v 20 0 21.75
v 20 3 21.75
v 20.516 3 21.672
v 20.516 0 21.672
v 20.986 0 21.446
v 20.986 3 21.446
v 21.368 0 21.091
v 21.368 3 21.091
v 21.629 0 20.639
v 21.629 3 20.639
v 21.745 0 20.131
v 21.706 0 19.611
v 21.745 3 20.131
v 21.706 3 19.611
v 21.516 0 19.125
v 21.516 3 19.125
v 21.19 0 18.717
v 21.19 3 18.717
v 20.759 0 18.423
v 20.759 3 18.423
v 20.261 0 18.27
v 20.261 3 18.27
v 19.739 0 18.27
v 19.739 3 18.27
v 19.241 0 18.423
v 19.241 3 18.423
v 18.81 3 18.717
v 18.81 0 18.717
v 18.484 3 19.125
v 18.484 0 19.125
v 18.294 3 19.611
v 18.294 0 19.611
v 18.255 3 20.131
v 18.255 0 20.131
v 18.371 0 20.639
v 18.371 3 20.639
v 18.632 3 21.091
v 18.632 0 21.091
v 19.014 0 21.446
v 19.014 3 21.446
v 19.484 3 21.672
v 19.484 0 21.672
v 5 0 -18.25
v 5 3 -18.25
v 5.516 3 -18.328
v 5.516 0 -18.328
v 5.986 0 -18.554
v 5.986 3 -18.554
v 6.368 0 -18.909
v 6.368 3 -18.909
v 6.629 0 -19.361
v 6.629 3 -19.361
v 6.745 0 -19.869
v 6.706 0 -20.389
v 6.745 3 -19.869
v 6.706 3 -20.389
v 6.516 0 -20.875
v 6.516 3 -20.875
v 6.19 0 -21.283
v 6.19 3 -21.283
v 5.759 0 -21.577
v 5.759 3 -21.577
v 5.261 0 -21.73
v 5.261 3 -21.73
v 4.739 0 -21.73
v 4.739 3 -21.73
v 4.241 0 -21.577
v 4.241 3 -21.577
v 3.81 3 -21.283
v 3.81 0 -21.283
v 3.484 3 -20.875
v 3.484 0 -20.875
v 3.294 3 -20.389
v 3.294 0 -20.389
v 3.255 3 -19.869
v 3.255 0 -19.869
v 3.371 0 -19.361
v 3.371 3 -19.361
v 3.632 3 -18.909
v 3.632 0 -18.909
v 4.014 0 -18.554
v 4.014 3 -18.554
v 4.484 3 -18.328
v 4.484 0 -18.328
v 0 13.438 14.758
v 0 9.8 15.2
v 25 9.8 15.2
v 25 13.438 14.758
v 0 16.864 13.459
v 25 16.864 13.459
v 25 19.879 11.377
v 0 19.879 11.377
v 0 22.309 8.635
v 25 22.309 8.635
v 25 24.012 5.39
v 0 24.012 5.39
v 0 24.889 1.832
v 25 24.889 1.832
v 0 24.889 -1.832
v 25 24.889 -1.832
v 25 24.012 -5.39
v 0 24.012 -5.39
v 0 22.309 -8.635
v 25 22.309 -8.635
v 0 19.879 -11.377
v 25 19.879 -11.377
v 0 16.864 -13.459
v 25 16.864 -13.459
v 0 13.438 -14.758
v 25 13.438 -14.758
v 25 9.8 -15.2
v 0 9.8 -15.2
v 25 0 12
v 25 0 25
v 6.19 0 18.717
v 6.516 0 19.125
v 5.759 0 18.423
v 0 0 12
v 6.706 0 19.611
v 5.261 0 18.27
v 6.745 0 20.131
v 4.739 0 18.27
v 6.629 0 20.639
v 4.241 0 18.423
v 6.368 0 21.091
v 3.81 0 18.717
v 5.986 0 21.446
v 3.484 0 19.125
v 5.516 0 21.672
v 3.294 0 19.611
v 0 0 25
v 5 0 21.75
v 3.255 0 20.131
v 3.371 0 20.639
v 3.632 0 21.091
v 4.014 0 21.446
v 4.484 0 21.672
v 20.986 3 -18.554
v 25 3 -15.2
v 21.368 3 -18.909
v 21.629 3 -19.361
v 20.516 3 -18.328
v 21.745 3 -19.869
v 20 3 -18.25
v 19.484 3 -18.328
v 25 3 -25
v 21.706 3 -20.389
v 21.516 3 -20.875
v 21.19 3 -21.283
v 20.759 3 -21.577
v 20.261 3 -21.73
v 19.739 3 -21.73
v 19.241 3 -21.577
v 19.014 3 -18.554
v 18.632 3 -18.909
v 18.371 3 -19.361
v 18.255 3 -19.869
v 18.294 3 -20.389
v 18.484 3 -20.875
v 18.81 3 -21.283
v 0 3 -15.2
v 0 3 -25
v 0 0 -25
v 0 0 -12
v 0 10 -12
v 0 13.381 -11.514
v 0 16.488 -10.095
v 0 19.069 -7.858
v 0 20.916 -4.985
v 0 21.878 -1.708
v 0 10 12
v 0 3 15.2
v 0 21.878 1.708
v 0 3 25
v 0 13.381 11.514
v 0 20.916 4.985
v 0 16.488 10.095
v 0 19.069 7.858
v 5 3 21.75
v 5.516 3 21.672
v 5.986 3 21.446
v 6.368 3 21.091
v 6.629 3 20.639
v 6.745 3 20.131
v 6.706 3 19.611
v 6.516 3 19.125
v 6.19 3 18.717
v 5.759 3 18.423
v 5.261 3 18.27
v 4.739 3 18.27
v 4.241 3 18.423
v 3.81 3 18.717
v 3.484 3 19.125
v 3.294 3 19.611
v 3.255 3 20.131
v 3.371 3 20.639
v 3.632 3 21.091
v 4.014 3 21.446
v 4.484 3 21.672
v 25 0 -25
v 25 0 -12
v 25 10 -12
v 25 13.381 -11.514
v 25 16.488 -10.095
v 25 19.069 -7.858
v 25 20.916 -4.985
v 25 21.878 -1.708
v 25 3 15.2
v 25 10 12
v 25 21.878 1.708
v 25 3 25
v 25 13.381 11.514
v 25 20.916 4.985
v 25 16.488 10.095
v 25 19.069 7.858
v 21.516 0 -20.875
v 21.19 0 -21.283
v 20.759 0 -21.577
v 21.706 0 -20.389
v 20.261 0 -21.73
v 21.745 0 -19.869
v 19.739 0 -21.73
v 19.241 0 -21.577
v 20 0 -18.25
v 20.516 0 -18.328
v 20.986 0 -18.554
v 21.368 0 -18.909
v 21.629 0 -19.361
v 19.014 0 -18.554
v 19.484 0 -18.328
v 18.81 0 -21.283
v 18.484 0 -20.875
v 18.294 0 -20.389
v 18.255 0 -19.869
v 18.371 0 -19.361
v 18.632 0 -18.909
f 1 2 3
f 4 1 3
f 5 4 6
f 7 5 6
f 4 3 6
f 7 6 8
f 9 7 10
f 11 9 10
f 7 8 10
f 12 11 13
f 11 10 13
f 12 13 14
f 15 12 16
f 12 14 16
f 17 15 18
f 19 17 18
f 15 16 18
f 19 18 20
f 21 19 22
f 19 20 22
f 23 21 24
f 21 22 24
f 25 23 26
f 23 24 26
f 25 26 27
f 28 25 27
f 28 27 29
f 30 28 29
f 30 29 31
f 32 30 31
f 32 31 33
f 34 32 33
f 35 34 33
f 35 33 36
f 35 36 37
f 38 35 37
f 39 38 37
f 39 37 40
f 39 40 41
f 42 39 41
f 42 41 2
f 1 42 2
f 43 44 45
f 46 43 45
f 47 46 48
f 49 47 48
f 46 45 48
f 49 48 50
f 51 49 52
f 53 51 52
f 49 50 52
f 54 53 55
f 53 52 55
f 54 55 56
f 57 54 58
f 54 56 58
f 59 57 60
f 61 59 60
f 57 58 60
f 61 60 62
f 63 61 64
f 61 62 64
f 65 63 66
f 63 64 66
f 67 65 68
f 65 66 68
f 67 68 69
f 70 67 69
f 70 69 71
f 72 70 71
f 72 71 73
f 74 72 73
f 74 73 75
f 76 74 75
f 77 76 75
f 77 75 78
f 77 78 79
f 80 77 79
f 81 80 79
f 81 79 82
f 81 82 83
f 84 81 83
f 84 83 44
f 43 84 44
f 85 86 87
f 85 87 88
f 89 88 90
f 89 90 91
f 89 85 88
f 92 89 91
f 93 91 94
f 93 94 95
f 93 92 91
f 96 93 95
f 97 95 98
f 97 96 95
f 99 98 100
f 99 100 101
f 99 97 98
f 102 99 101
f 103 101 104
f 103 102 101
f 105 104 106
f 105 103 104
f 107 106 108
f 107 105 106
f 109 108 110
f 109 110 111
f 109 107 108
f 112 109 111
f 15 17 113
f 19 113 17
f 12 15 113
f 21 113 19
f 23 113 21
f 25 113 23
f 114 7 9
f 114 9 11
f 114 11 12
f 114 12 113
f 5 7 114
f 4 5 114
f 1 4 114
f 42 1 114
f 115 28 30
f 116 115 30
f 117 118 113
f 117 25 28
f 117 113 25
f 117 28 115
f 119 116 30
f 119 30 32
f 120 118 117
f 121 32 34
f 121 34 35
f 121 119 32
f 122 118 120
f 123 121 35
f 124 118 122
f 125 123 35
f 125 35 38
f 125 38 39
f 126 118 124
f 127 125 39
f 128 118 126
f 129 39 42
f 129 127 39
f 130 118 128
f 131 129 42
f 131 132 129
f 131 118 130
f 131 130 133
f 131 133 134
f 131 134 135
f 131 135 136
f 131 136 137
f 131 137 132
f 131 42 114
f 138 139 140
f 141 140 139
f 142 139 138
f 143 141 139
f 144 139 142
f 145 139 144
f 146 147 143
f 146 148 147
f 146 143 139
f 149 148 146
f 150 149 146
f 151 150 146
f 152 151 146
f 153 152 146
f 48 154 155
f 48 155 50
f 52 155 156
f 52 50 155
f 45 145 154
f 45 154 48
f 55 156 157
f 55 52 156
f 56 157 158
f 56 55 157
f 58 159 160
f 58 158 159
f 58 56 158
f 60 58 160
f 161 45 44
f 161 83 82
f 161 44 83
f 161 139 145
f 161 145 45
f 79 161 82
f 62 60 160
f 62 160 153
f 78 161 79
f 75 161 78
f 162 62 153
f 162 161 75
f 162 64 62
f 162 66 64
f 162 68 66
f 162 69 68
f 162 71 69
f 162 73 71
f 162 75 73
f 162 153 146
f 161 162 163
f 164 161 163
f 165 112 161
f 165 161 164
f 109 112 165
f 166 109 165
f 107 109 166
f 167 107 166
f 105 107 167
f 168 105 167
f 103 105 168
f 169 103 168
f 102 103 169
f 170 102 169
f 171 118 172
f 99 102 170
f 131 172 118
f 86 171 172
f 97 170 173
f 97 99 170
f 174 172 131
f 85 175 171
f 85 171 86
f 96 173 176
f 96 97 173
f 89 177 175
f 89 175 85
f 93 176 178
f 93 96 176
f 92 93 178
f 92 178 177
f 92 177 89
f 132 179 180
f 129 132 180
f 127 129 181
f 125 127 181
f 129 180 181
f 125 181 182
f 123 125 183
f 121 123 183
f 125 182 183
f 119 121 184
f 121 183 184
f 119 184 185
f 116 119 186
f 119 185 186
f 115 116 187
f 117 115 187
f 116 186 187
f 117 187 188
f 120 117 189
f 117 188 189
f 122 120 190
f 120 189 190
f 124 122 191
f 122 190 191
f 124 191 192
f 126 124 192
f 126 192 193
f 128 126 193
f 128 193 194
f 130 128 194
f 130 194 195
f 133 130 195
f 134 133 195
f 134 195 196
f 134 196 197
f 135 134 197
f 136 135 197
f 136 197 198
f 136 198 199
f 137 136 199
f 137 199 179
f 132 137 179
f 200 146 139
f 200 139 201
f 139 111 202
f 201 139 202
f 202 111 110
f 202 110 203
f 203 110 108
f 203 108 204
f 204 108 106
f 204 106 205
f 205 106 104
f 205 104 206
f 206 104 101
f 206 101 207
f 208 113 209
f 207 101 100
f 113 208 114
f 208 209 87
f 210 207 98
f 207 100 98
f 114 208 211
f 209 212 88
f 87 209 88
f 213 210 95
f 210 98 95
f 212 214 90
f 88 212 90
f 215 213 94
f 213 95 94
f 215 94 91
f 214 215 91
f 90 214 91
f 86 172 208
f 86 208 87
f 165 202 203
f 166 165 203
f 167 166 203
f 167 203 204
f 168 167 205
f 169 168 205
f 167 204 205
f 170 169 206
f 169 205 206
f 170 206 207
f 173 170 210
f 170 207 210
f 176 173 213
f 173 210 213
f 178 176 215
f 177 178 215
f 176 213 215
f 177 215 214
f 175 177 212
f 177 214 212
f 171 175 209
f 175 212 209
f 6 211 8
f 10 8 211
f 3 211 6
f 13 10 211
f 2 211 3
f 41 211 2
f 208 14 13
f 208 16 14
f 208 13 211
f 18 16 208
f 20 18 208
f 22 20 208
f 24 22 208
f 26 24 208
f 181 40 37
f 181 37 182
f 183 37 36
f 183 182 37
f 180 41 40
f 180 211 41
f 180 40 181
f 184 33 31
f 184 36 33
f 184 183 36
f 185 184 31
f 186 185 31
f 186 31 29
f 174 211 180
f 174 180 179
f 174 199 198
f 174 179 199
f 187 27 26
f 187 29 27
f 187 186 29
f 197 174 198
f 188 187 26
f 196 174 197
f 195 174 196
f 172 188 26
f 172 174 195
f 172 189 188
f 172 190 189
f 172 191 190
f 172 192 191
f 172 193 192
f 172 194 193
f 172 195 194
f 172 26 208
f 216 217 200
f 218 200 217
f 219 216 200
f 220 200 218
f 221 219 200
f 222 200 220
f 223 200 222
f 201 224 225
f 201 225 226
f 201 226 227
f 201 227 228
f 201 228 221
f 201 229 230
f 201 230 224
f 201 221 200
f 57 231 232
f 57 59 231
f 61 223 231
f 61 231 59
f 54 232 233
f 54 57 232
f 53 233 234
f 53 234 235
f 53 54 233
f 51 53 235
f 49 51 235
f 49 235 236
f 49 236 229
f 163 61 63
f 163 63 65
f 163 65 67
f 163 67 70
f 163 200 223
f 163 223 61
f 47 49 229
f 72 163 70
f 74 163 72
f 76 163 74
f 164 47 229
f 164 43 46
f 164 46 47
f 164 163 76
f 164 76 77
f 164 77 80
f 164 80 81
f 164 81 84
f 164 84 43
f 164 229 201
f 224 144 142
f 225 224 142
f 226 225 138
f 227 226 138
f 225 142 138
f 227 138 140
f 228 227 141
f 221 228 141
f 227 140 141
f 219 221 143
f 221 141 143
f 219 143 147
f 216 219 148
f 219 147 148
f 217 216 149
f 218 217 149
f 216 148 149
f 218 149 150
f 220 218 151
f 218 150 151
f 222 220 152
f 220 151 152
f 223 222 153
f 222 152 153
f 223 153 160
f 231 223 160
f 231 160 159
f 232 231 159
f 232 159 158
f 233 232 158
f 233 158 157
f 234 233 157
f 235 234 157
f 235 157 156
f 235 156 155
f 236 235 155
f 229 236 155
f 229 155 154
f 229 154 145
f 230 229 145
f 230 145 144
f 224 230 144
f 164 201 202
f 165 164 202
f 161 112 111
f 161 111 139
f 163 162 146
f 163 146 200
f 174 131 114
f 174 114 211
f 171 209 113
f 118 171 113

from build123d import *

# Parameters (mm, degrees)
BOSS_EXTRUDE1_DEPTH = 25
CUT_EXTRUDE1_DEPTH  = 44.301270189
SKETCH3_R           = 1.75
CUT_EXTRUDE2_DEPTH  = 42.641325627


with BuildPart() as part:
    # Sketch1 → Boss-Extrude1 (new body)
    with BuildSketch(Plane(origin=(0, 0, 0), x_dir=(0, 0, -1), z_dir=(1, 0, 0))):
        with BuildLine():
            Line((-25, 0), (-25, 3))
            Line((-25, 3), (-15.2, 3))
            Line((-15.2, 3), (-15.2, 9.8))
            ThreePointArc((-15.2, 9.8), (0, 25), (15.2, 9.8))
            Line((15.2, 9.8), (15.2, 3))
            Line((15.2, 3), (25, 3))
            Line((25, 3), (25, 0))
            Line((25, 0), (-25, 0))
        make_face()
    extrude(amount=BOSS_EXTRUDE1_DEPTH)

    # Sketch2 → Cut-Extrude1 (cut, through all)
    with BuildSketch(Plane(origin=(25, 0, 0), x_dir=(0, 0, -1), z_dir=(1, 0, 0))):
        with BuildLine():
            Line((-12, 10), (-12, 0))
            Line((-12, 0), (12, 0))
            Line((12, 0), (12, 10))
            ThreePointArc((12, 10), (0, 22), (-12, 10))
        make_face()
    extrude(amount=-CUT_EXTRUDE1_DEPTH, mode=Mode.SUBTRACT)

    # Sketch3 → Cut-Extrude2 (cut, through all)
    with BuildSketch(Plane(origin=(0, 3, 0), x_dir=(1, 0, 0), z_dir=(0, 1, 0))):
        with Locations(Location((5, -20, 0), (0, 0, 270))):
            Circle(SKETCH3_R)
        with Locations(Location((20, -20, 0), (0, 0, 270))):
            Circle(SKETCH3_R)
        with Locations(Location((5, 20, 0), (0, 0, 270))):
            Circle(SKETCH3_R)
        with Locations(Location((20, 20, 0), (0, 0, 270))):
            Circle(SKETCH3_R)
    extrude(amount=-CUT_EXTRUDE2_DEPTH, mode=Mode.SUBTRACT)


solid = part.part
